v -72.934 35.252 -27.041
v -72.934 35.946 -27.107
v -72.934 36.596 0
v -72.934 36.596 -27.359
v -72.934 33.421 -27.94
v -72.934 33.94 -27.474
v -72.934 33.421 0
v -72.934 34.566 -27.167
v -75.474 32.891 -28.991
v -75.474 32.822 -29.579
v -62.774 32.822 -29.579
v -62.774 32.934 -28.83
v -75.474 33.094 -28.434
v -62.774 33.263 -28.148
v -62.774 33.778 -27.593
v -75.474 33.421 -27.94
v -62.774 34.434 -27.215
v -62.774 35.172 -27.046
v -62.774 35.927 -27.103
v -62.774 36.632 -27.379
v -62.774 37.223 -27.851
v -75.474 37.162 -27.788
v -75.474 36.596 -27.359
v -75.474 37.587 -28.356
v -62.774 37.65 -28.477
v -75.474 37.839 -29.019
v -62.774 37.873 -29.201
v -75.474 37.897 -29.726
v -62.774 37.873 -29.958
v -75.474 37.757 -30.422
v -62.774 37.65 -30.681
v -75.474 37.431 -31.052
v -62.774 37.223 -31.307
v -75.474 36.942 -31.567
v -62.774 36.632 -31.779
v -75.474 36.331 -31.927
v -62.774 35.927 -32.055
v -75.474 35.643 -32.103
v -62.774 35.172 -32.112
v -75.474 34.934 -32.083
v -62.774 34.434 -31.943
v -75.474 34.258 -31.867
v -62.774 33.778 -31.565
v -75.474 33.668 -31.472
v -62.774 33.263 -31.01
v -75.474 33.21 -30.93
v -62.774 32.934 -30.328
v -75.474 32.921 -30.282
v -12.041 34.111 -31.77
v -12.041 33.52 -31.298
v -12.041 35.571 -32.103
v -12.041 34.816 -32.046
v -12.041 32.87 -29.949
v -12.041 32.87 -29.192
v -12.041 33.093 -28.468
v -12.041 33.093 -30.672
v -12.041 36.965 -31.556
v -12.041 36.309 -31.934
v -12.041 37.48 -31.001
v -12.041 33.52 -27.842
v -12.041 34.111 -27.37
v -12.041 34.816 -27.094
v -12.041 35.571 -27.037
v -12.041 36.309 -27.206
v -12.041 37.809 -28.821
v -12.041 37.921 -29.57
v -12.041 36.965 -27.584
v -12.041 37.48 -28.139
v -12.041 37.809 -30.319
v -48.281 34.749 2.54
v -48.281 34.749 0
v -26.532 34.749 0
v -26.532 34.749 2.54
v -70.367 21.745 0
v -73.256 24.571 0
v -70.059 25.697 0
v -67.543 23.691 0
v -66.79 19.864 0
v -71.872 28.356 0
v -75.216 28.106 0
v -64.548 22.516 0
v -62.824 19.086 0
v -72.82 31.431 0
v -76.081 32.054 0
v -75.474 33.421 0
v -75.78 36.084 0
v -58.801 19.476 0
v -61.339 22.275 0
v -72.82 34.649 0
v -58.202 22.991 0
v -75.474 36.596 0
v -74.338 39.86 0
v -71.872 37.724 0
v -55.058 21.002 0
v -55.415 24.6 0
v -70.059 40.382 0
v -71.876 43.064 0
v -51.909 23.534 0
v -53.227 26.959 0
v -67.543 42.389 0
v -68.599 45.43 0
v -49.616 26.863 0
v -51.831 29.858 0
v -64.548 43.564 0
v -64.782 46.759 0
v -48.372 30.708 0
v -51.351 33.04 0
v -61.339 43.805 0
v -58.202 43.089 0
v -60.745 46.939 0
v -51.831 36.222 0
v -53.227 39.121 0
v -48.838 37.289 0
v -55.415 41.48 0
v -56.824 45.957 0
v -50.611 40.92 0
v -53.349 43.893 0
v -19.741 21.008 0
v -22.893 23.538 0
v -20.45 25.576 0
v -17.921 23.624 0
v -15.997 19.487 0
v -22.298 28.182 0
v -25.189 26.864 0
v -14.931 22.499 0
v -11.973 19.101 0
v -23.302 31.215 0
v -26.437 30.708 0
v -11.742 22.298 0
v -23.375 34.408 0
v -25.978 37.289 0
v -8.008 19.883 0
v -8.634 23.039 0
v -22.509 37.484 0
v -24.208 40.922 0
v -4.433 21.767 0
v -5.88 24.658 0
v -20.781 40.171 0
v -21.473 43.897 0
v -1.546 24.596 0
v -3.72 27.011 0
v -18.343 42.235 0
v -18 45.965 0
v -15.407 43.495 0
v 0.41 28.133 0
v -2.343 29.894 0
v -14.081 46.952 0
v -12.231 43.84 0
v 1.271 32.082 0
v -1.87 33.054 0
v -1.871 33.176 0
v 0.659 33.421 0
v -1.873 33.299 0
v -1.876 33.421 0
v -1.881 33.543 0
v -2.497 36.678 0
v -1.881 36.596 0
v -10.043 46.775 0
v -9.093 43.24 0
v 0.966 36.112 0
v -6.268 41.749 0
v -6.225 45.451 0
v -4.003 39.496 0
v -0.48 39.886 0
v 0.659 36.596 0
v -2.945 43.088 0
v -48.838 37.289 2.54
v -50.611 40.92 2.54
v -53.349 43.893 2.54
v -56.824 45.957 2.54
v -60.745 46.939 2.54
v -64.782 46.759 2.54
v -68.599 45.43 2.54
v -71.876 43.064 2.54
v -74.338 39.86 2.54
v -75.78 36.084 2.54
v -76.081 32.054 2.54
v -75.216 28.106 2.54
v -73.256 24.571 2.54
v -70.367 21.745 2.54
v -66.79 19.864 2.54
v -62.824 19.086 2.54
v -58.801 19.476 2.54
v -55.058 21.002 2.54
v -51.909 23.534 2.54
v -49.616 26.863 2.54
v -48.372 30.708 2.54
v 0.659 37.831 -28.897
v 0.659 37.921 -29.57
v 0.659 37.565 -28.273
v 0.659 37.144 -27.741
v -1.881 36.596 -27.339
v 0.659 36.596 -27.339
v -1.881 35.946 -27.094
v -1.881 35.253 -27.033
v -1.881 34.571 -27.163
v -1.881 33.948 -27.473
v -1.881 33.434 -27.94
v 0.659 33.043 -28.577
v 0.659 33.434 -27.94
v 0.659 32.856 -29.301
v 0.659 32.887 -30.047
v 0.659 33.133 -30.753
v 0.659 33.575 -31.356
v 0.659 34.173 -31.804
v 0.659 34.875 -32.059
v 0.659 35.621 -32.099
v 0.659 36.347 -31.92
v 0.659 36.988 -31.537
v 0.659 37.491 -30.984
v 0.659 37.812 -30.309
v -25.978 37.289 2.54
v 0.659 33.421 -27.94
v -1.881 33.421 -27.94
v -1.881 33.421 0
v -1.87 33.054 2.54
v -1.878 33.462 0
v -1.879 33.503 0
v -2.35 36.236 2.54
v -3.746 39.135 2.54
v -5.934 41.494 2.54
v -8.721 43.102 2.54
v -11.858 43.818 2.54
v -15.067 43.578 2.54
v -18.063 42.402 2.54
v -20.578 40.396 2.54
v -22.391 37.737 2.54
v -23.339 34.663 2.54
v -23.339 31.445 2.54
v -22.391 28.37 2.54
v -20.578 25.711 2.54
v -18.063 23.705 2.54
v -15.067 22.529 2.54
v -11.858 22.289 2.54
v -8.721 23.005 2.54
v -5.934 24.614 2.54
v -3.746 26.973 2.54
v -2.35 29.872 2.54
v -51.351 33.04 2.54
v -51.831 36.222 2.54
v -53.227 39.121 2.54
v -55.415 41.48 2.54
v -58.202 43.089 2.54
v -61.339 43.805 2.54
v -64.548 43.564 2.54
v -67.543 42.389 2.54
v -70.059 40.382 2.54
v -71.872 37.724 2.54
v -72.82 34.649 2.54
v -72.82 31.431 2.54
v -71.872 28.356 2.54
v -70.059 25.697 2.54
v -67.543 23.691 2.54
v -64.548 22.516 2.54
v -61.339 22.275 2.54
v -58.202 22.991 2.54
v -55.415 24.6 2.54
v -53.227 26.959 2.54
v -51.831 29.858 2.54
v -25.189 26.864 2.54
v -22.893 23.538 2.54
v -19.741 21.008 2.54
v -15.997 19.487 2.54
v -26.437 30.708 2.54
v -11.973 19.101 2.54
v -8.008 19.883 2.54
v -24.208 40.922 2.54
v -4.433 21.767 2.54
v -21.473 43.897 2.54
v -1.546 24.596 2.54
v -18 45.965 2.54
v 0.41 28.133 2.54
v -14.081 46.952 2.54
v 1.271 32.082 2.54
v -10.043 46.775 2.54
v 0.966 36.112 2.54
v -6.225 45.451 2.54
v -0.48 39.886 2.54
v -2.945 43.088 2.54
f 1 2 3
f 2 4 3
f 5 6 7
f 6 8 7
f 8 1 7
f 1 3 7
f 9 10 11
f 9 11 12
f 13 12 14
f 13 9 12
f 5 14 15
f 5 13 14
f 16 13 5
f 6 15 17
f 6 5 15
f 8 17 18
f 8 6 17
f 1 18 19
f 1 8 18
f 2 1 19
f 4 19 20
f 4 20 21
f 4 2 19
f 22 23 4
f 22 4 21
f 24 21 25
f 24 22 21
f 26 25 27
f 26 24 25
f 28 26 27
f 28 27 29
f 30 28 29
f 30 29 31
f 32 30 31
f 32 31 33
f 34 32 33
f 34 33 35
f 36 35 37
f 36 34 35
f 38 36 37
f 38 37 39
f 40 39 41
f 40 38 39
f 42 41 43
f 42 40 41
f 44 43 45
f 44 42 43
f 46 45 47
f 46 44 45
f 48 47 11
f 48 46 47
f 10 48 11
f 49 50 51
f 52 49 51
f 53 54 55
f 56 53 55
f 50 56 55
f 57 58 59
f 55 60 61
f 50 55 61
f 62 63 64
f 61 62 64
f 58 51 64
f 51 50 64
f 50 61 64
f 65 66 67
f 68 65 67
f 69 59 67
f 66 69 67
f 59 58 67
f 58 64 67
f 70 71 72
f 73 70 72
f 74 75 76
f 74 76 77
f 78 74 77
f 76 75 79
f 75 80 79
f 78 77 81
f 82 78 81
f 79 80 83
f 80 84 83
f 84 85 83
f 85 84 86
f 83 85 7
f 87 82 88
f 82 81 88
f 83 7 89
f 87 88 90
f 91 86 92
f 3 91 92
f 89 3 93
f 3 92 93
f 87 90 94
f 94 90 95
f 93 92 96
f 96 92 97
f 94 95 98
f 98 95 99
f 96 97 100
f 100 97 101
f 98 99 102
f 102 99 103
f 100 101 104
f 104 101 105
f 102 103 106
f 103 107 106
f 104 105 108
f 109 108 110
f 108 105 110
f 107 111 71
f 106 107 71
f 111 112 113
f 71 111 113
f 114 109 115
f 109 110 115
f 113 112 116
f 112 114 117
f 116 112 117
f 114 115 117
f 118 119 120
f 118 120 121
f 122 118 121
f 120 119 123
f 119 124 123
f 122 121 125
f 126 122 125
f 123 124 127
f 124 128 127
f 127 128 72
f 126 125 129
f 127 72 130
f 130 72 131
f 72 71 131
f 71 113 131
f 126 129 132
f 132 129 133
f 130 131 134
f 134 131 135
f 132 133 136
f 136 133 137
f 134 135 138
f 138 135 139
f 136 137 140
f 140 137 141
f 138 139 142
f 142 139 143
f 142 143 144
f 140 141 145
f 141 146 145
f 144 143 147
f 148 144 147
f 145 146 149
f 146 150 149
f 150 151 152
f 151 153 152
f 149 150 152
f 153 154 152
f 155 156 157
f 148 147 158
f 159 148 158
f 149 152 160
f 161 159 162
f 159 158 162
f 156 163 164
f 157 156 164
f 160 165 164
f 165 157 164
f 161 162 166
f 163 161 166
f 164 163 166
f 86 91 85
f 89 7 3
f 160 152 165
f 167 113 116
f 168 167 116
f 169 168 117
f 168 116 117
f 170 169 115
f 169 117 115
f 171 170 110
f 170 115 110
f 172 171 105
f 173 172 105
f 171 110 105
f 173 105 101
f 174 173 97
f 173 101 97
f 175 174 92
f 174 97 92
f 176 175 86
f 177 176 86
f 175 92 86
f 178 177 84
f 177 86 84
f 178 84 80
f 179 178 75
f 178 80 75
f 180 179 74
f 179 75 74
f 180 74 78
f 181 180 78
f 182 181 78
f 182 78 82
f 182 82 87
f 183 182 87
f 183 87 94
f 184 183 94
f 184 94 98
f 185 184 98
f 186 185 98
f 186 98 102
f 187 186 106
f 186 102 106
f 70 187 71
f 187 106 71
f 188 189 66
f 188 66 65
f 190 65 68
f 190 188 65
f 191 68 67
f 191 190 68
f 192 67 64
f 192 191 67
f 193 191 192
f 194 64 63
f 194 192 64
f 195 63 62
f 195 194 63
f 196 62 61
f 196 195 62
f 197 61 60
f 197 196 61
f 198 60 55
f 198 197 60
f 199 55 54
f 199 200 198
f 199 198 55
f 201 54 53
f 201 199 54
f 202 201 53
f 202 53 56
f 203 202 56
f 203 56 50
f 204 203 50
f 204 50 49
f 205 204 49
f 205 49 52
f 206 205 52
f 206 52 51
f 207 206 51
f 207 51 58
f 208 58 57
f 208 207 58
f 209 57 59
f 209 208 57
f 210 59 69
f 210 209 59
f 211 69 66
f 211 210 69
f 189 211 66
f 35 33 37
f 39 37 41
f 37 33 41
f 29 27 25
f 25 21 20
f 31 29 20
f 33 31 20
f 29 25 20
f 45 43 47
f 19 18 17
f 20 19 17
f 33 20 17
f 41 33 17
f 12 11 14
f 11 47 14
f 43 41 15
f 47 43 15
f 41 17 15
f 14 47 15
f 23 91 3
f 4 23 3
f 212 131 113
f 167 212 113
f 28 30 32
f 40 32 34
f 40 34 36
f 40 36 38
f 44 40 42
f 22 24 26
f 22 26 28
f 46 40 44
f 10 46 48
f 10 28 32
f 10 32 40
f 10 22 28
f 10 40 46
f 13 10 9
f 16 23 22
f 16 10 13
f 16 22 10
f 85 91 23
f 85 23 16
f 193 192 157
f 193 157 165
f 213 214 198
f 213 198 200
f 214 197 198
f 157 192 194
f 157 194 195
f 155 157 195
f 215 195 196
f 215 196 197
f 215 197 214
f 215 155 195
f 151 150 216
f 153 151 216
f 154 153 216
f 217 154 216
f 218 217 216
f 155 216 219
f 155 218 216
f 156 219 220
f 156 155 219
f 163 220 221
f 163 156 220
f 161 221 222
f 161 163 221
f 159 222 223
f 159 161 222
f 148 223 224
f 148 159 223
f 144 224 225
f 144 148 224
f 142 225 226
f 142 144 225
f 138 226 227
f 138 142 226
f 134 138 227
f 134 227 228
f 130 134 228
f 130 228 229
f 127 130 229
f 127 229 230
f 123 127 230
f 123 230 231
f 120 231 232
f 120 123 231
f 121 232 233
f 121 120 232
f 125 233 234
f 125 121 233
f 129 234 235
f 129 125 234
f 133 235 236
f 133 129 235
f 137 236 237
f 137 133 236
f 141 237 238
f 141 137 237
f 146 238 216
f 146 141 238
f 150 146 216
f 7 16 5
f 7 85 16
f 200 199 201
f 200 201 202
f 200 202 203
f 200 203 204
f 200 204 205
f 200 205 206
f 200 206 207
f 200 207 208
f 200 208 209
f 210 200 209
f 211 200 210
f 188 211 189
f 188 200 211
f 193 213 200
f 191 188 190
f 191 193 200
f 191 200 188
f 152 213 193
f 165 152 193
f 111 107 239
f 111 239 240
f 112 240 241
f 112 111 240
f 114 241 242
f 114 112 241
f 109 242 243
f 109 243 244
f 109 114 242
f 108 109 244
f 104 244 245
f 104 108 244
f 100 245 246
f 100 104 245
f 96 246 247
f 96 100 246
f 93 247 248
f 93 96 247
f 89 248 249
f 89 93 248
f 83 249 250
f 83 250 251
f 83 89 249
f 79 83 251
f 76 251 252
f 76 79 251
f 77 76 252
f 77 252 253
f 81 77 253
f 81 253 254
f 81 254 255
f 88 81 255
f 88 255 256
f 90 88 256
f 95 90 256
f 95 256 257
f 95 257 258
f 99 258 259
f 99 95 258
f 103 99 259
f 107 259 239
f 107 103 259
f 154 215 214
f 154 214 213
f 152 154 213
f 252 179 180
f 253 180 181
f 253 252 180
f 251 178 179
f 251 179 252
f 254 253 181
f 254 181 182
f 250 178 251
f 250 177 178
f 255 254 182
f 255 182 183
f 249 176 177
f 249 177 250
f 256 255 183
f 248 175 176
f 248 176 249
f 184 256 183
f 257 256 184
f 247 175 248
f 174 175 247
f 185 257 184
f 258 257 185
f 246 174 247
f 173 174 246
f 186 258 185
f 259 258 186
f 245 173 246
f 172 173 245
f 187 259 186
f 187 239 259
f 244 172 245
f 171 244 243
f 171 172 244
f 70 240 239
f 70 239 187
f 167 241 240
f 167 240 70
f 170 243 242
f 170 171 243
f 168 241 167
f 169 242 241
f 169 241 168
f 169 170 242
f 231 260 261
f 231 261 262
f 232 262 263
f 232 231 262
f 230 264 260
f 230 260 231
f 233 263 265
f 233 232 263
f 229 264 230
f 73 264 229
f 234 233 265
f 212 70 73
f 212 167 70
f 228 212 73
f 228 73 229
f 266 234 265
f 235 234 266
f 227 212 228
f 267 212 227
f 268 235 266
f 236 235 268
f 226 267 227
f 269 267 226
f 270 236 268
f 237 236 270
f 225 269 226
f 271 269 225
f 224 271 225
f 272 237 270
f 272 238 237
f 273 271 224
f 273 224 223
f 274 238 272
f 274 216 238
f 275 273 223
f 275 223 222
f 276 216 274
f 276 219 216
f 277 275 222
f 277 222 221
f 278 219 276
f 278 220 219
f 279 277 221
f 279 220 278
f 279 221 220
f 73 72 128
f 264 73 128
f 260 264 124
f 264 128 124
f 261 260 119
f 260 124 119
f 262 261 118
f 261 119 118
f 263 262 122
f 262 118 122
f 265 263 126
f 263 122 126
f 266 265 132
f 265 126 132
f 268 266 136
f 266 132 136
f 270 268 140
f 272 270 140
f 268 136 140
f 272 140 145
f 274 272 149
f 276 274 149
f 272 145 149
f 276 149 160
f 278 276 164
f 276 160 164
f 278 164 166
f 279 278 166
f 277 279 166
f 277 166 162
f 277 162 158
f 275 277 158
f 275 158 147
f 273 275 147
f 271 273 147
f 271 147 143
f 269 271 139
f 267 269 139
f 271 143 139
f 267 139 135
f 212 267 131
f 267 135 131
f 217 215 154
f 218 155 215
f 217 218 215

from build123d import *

# Parameters (mm, degrees)
F0_R     = 10.795
F1_DEPTH = 2.54
F2_W     = 2.54
F2_H     = 3.175
F3_DEPTH = 27.94
F4_R     = 2.54
F5_DEPTH = 12.7
F6_R     = 2.54
F7_DEPTH = 12.7


with BuildPart() as f1:
    # F0 (on Top) → F1 (new body)
    with BuildSketch(Plane.XY):
        with BuildLine():
            Line((-25.97766, 37.288579), (-48.83766, 37.288579))
            ThreePointArc((-48.83766, 37.288579), (-75.791844, 30.04831), (-48.28081, 34.748579))
            Line((-48.28081, 34.748579), (-26.531821, 34.748579))
            ThreePointArc((-26.531821, 34.748579), (0.983912, 30.075824), (-25.97766, 37.288579))
        make_face()
        with Locations((-62.145926, 33.039937)):
            Circle(F0_R, mode=Mode.SUBTRACT)
        with Locations((-12.665021, 33.053661)):
            Circle(F0_R, mode=Mode.SUBTRACT)
    extrude(amount=F1_DEPTH)

    # F2 (on face) → F3 (join)
    with BuildSketch(Plane(origin=(0, 0, 0), x_dir=(1, 0, 0), z_dir=(0, 0, -1))):
        with Locations((-74.204193, -35.008655)):
            Rectangle(F2_W, F2_H)
        with Locations((-0.611128, -35.008655)):
            Rectangle(F2_W, F2_H)
    extrude(amount=F3_DEPTH)

    # F4 (on face) → F5 (join)
    with BuildSketch(Plane(origin=(-75.474193, 0, 0), x_dir=(0, -1, 0), z_dir=(-1, 0, 0))):
        with Locations((-35.361529, -29.579069)):
            Circle(F4_R)
    extrude(amount=-F5_DEPTH)

    # F6 (on face) → F7 (join)
    with BuildSketch(Plane.YZ.offset(0.658872)):
        with Locations((35.381455, -29.570073)):
            Circle(F6_R)
    extrude(amount=-F7_DEPTH)


solid = f1.part
